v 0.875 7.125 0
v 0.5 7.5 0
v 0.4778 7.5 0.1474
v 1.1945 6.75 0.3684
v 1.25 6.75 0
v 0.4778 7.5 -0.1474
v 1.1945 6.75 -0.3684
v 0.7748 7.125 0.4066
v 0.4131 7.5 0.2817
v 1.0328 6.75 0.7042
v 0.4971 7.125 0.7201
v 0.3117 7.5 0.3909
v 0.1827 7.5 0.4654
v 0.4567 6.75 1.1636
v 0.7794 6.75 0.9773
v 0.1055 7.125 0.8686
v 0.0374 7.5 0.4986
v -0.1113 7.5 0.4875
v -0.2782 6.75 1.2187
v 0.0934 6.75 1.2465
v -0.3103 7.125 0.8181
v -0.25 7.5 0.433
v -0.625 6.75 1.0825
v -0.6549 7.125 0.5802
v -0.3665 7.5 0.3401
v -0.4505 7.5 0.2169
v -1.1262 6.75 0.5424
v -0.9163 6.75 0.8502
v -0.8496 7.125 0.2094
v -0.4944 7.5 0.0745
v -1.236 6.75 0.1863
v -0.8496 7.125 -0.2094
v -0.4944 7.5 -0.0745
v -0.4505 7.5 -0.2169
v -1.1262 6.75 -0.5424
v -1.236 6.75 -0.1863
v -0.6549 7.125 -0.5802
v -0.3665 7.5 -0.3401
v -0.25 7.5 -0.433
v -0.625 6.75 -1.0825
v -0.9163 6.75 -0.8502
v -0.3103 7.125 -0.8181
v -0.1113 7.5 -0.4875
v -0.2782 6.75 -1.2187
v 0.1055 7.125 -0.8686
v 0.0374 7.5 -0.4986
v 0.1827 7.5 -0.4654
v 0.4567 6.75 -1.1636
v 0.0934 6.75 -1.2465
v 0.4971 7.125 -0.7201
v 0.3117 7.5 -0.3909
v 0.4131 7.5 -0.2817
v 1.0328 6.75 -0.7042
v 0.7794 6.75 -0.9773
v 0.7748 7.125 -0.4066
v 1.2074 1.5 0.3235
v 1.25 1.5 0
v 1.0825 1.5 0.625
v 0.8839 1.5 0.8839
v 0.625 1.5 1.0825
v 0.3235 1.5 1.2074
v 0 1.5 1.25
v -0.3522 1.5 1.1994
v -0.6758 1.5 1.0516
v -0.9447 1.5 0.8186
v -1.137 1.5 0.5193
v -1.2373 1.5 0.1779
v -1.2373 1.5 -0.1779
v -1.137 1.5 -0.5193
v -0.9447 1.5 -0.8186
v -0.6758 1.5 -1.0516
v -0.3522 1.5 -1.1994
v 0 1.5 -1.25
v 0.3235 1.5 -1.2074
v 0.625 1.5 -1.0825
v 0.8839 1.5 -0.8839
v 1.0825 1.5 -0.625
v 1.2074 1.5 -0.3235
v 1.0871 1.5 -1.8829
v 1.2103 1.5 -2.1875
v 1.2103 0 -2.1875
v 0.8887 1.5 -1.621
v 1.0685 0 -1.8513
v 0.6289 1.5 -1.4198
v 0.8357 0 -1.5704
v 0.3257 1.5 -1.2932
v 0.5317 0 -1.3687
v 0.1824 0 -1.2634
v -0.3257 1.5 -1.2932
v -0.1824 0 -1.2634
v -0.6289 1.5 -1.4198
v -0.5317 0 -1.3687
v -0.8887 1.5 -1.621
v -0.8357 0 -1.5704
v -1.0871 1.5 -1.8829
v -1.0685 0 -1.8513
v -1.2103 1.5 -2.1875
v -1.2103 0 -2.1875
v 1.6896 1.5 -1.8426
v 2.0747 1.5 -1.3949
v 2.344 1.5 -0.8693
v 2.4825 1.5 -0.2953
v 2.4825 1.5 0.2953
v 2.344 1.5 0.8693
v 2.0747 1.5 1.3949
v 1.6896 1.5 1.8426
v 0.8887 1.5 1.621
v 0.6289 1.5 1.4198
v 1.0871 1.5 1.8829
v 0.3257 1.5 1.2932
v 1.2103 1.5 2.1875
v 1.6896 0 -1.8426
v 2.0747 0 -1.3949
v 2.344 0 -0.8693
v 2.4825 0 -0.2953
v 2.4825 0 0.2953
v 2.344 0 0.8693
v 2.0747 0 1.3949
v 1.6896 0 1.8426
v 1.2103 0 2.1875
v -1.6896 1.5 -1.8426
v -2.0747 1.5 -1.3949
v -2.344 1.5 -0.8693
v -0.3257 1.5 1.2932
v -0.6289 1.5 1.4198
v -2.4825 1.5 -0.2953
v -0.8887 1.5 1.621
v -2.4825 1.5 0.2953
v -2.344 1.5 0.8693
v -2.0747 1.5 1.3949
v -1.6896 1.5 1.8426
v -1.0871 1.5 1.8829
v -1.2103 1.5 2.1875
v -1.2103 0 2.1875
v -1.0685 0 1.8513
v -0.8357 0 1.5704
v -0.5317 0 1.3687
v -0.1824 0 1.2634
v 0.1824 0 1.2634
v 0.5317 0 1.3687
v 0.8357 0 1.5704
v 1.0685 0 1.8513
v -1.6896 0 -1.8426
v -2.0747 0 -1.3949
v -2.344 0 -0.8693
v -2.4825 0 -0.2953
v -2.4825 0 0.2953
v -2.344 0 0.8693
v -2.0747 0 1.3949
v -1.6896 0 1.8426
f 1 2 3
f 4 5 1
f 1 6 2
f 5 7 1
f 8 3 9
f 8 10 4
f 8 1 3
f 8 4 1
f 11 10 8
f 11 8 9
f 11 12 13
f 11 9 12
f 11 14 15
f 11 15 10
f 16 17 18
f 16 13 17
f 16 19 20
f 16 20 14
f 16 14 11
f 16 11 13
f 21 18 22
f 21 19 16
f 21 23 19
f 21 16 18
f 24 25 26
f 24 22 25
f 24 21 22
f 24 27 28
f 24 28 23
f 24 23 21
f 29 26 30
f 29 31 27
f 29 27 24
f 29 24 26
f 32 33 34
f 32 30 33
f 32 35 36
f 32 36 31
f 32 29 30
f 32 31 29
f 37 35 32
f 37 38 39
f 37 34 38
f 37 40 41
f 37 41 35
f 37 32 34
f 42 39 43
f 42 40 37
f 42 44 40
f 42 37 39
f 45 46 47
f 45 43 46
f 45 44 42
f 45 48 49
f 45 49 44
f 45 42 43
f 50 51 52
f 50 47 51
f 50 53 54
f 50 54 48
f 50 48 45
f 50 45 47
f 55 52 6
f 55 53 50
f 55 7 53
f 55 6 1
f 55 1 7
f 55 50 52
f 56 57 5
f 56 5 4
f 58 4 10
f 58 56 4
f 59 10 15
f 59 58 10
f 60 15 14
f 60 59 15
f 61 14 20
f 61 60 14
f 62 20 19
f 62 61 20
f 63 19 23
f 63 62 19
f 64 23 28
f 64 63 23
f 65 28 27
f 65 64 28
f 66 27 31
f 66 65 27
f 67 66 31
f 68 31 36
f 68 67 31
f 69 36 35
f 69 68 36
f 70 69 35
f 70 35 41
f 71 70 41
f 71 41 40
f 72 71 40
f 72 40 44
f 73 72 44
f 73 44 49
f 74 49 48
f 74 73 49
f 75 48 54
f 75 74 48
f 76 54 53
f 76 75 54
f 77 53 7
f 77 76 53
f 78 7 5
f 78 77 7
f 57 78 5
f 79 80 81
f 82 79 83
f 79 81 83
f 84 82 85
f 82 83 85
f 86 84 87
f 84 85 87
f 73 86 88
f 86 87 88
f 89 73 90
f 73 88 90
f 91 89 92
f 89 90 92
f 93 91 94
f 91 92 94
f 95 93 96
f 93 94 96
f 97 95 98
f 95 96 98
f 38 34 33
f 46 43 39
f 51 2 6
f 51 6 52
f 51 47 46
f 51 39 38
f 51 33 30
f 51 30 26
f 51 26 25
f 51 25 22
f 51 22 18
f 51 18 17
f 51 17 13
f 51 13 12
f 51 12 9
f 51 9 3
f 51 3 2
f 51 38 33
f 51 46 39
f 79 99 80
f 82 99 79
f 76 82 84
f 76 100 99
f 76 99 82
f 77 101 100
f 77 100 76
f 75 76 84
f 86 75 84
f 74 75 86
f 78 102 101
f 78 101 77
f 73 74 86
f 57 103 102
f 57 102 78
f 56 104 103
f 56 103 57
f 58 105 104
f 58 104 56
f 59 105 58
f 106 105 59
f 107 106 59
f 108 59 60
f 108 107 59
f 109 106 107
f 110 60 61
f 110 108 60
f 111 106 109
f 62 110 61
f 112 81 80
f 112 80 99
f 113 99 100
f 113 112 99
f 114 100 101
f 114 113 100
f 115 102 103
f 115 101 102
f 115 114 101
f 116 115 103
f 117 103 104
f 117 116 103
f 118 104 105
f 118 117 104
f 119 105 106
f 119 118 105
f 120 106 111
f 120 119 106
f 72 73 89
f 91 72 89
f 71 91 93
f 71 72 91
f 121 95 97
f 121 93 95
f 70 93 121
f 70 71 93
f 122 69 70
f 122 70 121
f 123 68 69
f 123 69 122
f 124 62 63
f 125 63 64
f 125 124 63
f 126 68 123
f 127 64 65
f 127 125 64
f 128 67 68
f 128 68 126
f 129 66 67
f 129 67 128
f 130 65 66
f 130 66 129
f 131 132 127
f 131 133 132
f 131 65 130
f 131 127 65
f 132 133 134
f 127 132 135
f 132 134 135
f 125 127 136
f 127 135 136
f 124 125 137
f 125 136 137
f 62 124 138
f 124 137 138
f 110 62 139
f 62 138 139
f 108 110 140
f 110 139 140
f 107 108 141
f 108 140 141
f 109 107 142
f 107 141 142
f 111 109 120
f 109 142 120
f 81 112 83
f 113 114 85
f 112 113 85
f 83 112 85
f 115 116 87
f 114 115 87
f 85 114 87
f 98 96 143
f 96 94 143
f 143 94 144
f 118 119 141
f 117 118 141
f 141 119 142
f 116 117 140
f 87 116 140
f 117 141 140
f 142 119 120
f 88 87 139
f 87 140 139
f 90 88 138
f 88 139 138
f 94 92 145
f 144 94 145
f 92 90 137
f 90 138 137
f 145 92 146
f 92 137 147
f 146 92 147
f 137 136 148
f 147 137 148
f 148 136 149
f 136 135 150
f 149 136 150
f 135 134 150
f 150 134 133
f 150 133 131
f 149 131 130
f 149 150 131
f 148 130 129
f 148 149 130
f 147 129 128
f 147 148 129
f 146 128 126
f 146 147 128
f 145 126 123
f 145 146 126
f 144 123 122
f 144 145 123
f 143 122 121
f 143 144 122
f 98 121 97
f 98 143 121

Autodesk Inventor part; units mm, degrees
ref_plane "YZ Plane" through (0, 0, 0) normal (1, 0, 0) x (0, 1, 0)
ref_plane "XZ Plane" through (0, 0, 0) normal (0, 1, 0) x (-1, 0, 0)
ref_plane "XY Plane" through (0, 0, 0) normal (0, 0, 1) x (1, 0, 0)
sketch "Sketch1" plane through (0, 0, 0) normal (0, 1, 0) x (-1, 0, 0)
  circle A0 centre (0, 0) radius 2.5
  circle A1 centre (0, 2.5) radius 1.25
  circle A2 centre (0, -2.5) radius 1.25
  point P0 (-1.2103, -2.1875)
  point P1 (1.2103, -2.1875)
  point P2 (1.2103, 2.1875)
  point P3 (-1.2103, 2.1875)
  dimension "d0" = 5
  dimension "d1" = 2.5
  dimension "d2" = 2.5
extrude "Extrusion1" add sketch "Sketch1" along normal blind 1.5 contours A0 A2 A1
sketch "Sketch2" plane through (0, 1.5, 0) normal (0, 1, 0) x (1, 0, 0)
  circle A0 centre (0, 0) radius 1.25
  dimension "d5" = 2.5
extrude "Extrusion2" add sketch "Sketch2" along normal blind 6
chamfer "Chamfer1" distance 0.75 angle 45 1 edges at (-1.25, 7.5, 0)
properties part number "hot_pin_6"
